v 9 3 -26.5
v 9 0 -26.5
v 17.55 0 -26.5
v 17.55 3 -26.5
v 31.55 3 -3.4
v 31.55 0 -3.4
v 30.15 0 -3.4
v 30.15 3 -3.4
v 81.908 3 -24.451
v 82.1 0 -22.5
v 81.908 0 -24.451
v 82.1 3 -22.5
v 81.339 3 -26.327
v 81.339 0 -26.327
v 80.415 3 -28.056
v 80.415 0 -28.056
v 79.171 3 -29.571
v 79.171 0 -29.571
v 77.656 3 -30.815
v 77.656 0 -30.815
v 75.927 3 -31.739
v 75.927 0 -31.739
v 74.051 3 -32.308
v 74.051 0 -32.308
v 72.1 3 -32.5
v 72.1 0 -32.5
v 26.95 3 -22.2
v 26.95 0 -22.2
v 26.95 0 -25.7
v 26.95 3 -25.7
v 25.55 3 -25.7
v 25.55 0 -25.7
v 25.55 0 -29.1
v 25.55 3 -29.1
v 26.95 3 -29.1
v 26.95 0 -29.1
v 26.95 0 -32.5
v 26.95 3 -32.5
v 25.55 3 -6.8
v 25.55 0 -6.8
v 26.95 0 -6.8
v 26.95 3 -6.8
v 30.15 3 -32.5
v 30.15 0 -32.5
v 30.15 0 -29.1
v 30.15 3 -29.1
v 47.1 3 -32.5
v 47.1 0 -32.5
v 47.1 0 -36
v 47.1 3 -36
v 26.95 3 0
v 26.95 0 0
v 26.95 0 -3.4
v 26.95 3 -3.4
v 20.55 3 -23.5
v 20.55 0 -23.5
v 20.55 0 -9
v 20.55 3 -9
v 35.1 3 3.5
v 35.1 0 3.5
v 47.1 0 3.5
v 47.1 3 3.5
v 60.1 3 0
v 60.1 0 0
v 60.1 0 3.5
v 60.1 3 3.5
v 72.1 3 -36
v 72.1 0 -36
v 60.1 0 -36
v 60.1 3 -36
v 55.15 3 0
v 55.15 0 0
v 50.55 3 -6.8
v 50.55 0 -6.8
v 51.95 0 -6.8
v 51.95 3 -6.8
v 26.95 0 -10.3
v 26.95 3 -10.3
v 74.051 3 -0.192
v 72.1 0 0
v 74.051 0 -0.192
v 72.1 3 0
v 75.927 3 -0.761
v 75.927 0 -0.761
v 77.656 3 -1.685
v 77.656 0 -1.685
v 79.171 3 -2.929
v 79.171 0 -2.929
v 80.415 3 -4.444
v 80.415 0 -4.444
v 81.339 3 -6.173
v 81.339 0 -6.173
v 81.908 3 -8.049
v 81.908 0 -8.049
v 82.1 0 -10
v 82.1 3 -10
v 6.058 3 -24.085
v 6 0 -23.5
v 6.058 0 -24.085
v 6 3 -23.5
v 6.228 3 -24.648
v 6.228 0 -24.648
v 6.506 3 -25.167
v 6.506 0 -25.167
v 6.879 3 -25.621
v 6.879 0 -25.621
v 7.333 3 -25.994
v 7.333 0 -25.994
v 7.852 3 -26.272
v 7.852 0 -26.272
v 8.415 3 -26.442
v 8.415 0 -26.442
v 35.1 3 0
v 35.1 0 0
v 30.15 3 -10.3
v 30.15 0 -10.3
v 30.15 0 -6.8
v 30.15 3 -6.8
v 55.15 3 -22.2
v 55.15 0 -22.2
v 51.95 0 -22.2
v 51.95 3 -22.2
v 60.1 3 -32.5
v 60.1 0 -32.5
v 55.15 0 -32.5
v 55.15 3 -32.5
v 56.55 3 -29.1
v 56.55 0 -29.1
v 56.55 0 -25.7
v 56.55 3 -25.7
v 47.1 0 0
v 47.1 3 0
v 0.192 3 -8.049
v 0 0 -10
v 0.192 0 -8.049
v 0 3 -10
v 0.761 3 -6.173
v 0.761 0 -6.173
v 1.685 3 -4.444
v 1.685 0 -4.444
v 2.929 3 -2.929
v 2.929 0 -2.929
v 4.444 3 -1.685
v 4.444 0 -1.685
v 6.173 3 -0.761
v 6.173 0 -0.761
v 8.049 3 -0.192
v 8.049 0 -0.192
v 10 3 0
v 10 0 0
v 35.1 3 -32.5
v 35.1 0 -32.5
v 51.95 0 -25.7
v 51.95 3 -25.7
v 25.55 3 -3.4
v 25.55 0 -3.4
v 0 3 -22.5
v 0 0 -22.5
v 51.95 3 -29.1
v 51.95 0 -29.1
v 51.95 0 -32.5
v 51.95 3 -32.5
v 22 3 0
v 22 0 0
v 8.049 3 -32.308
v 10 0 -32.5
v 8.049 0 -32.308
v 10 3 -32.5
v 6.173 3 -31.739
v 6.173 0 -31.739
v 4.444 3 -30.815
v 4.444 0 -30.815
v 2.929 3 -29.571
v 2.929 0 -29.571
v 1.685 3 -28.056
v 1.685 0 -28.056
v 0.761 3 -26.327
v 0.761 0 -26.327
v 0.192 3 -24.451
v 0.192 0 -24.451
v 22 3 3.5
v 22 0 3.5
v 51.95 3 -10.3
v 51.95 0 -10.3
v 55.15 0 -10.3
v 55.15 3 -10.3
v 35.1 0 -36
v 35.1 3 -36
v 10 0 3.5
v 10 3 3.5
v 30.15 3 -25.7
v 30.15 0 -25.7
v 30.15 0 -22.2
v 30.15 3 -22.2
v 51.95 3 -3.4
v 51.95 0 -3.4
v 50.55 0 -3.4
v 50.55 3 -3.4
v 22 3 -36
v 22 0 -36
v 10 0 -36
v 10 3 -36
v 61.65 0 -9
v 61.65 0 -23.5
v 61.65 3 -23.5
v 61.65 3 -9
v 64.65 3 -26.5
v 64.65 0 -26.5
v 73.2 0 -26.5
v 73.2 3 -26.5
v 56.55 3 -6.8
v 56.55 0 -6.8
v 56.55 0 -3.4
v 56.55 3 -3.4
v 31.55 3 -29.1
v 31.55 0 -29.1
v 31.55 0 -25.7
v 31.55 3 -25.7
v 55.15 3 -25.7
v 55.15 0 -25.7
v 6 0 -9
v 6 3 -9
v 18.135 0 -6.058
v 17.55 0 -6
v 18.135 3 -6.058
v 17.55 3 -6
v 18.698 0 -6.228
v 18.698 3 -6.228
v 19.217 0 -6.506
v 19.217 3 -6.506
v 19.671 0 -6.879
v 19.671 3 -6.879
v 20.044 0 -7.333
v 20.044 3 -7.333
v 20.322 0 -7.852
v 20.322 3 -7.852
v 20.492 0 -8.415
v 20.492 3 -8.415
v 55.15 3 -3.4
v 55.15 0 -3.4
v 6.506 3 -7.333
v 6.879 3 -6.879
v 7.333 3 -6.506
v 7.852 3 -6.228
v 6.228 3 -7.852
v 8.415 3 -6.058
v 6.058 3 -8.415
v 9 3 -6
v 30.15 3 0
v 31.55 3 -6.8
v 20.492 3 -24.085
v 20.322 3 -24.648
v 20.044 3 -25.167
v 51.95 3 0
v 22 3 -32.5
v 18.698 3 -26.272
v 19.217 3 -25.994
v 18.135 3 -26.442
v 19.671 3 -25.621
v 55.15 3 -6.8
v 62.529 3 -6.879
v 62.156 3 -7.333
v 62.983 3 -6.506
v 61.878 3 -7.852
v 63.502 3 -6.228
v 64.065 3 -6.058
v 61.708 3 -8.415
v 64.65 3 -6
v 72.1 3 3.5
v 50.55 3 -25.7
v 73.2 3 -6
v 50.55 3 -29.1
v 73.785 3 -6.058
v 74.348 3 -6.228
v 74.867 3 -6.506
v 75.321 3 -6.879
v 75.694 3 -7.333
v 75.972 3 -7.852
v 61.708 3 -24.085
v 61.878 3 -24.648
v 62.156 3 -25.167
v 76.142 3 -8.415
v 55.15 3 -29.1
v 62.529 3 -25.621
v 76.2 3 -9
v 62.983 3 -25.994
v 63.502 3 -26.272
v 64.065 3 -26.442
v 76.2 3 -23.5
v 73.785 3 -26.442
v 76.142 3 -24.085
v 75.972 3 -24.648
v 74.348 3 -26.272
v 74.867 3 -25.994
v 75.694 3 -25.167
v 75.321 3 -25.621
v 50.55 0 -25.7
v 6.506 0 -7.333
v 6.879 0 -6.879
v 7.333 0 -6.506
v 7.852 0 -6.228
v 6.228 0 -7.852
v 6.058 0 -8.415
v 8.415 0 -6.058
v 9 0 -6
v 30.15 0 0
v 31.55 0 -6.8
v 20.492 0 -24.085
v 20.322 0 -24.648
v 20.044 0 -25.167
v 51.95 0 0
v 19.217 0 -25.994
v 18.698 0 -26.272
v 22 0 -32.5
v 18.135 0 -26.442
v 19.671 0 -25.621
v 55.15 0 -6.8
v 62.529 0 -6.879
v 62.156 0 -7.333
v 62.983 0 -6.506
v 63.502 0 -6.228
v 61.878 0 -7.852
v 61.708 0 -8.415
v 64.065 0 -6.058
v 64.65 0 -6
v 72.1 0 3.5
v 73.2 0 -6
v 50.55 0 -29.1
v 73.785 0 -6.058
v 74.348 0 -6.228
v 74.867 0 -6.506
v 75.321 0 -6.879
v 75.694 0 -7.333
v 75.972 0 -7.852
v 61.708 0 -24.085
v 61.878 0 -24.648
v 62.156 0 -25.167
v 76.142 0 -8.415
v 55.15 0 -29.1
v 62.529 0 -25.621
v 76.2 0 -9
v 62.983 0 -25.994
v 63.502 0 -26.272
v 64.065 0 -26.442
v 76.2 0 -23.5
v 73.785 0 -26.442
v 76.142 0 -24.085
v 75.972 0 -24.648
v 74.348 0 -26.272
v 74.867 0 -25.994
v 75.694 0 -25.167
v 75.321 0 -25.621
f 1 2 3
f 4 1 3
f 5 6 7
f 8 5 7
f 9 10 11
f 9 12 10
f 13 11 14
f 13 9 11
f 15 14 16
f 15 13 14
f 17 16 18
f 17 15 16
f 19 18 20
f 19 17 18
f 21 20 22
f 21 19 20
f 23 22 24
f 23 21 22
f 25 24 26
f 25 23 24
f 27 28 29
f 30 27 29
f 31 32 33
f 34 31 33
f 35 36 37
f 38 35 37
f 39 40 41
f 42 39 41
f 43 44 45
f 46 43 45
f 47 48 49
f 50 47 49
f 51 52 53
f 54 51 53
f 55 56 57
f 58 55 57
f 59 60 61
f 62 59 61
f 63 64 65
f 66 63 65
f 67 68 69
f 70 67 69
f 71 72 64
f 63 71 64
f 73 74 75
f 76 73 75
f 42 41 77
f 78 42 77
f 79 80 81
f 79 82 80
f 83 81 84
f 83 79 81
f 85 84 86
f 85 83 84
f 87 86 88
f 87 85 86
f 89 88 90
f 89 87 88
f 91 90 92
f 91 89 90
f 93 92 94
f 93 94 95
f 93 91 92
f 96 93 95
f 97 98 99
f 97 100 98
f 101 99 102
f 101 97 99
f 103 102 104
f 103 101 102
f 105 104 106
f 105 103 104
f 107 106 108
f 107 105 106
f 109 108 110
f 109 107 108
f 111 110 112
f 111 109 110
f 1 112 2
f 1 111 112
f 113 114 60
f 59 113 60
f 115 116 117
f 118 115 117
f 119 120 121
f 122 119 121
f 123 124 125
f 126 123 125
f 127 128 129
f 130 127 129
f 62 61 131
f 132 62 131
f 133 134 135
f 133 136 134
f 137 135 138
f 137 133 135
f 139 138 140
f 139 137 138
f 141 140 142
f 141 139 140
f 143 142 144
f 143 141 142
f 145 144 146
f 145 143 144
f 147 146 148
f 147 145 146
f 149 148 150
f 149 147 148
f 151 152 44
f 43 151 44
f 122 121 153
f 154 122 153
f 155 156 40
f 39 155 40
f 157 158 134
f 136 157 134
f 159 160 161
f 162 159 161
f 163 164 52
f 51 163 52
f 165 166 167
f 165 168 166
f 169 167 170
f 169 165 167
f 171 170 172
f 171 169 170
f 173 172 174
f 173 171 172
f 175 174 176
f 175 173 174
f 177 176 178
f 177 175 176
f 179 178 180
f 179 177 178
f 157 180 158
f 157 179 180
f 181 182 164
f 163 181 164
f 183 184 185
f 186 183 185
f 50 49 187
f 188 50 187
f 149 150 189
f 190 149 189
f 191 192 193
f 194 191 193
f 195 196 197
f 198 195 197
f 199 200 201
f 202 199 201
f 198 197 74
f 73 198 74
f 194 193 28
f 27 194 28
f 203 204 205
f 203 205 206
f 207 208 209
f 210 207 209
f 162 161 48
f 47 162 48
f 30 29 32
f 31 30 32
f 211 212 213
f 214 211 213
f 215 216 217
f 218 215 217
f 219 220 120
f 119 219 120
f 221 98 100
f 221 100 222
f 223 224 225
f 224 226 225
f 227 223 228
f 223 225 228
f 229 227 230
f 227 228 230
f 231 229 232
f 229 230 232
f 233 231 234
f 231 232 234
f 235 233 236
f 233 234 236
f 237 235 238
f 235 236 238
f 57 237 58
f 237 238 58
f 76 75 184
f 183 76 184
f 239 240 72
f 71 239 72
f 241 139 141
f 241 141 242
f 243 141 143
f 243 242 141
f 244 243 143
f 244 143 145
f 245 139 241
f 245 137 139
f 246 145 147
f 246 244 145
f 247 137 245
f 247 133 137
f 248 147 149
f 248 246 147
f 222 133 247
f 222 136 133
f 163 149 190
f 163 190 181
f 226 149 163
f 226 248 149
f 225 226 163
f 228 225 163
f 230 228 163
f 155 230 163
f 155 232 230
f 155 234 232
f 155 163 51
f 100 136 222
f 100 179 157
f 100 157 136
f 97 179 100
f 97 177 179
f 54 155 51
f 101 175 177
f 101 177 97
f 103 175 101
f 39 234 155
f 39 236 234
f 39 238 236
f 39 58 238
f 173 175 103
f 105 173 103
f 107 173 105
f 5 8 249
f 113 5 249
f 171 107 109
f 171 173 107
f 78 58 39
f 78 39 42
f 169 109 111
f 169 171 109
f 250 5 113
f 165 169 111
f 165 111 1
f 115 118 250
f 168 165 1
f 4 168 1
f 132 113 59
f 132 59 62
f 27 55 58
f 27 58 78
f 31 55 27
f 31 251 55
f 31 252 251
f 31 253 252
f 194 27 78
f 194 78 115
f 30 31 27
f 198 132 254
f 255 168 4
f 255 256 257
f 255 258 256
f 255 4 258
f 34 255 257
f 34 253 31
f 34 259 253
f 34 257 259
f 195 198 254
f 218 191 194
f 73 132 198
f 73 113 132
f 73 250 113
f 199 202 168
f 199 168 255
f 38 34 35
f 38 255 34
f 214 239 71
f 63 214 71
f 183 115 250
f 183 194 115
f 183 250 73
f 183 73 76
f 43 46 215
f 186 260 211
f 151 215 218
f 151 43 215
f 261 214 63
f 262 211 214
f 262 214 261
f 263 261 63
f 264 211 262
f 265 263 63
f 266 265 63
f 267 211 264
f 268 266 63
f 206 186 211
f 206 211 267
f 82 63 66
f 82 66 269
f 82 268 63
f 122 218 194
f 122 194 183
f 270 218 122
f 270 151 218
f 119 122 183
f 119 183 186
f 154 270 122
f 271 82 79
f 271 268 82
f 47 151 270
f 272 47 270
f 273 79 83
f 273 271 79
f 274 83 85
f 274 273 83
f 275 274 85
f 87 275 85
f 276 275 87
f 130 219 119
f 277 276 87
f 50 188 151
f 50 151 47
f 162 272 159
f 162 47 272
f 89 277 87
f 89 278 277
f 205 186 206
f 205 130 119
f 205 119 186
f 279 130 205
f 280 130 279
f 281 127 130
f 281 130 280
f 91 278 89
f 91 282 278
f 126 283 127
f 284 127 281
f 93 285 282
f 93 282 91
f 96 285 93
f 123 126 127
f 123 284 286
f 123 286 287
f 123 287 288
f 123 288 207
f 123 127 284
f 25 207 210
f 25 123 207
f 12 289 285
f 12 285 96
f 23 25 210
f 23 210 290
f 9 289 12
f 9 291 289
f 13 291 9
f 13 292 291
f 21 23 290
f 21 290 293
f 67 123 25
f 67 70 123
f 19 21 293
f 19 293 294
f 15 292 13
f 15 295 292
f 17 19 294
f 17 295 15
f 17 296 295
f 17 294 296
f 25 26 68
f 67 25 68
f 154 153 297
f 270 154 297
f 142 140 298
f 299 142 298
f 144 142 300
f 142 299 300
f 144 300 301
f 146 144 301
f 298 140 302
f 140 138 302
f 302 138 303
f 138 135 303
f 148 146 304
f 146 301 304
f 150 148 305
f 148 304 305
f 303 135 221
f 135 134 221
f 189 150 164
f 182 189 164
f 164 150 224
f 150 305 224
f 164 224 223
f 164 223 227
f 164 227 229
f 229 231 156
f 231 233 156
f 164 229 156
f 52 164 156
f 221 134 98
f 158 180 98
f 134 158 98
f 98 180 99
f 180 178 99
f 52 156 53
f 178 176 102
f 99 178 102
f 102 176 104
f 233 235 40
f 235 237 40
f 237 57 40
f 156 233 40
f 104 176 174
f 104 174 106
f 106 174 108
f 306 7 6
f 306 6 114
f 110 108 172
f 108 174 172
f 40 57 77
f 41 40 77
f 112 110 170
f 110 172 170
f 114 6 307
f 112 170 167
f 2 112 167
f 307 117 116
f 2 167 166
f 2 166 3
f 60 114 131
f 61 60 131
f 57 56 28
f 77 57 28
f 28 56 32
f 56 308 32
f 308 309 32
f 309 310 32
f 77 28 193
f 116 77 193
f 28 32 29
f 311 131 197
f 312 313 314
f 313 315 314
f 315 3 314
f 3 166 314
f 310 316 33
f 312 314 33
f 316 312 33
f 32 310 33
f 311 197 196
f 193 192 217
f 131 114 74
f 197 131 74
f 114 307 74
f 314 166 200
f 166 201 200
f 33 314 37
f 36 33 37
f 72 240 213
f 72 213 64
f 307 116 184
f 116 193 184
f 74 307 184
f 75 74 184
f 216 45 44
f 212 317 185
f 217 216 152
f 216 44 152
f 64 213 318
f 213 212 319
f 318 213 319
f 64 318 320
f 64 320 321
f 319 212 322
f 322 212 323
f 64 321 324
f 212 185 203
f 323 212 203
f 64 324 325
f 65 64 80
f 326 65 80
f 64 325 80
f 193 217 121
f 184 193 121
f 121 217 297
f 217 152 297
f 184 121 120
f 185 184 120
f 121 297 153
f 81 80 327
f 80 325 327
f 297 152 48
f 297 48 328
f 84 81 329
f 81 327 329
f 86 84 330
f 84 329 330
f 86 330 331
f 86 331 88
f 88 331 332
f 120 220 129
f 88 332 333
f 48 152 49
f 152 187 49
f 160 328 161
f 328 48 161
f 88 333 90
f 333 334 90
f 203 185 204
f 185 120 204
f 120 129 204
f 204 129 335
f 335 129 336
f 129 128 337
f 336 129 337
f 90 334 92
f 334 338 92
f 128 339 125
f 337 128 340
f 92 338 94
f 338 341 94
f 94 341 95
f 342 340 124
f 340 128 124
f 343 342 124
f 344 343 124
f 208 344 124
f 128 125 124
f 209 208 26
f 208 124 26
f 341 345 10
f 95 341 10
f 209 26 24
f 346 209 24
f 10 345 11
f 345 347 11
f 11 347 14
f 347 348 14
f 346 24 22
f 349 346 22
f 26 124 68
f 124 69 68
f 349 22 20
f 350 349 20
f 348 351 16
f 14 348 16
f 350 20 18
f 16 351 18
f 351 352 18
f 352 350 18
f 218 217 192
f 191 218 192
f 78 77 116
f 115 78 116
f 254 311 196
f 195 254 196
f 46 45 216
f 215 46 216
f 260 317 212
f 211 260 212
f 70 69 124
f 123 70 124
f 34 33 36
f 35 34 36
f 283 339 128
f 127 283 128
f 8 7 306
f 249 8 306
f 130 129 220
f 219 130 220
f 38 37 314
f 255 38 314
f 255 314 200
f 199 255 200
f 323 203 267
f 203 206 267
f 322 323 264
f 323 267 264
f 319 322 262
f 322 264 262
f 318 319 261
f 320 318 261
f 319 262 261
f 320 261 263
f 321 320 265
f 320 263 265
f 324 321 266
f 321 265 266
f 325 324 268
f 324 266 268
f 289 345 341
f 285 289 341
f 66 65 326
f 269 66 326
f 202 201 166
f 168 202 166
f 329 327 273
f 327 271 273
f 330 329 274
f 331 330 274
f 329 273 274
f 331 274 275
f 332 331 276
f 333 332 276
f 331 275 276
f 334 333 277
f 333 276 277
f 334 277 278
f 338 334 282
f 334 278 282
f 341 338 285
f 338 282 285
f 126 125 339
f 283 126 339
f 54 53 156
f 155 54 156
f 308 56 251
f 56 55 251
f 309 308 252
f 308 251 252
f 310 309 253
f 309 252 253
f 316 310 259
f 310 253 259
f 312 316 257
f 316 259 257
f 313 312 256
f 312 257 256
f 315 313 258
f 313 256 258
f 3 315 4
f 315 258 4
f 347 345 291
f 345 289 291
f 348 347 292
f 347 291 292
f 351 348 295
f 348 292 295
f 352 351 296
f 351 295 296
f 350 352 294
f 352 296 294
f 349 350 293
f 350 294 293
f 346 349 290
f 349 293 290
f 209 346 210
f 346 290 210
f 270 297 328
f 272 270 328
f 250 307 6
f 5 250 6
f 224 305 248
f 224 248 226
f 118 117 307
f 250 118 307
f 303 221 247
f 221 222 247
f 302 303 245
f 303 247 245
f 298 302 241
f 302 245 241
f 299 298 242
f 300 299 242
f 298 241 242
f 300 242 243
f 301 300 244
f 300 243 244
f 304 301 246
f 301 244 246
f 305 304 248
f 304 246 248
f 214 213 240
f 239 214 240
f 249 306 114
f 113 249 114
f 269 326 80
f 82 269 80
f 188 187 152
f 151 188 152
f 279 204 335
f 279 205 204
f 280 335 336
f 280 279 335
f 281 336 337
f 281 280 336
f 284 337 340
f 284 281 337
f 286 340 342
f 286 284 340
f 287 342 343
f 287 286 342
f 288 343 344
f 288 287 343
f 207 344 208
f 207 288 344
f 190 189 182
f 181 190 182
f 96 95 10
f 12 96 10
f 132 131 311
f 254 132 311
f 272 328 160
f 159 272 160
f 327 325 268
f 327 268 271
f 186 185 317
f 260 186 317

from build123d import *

# Parameters (mm, degrees)
EXTRUDE_1_DEPTH     = 3
FILLET_1_R          = 10
SKETCH_2_W          = 14.55
SKETCH_2_H          = 20.5
CUT_EXTRUDE_1_DEPTH = 90.696209507
FILLET_2_R          = 3


with BuildPart() as part:
    # 草图1 → 凸台-拉伸1 (new body)
    with BuildSketch(Plane(origin=(0, 0, 0), x_dir=(1, 0, 0), z_dir=(0, 1, 0))):
        Polygon((10, 0), (10, -3.5), (22, -3.5), (22, 0), (26.95, 0), (26.95, 3.4), (25.55, 3.4), (25.55, 6.8), (26.95, 6.8), (26.95, 10.3), (30.15, 10.3), (30.15, 6.8), (31.55, 6.8), (31.55, 3.4), (30.15, 3.4), (30.15, 0), (35.1, 0), (35.1, -3.5), (47.1, -3.5), (47.1, 0), (51.95, 0), (51.95, 3.4), (50.55, 3.4), (50.55, 6.8), (51.95, 6.8), (51.95, 10.3), (55.15, 10.3), (55.15, 6.8), (56.55, 6.8), (56.55, 3.4), (55.15, 3.4), (55.15, 0), (60.1, 0), (60.1, -3.5), (72.1, -3.5), (72.1, 0), (82.1, 0), (82.1, 32.5), (72.1, 32.5), (72.1, 36), (60.1, 36), (60.1, 32.5), (55.15, 32.5), (55.15, 29.1), (56.55, 29.1), (56.55, 25.7), (55.15, 25.7), (55.15, 22.2), (51.95, 22.2), (51.95, 25.7), (50.55, 25.7), (50.55, 29.1), (51.95, 29.1), (51.95, 32.5), (47.1, 32.5), (47.1, 36), (35.1, 36), (35.1, 32.5), (30.15, 32.5), (30.15, 29.1), (31.55, 29.1), (31.55, 25.7), (30.15, 25.7), (30.15, 22.2), (26.95, 22.2), (26.95, 25.7), (25.55, 25.7), (25.55, 29.1), (26.95, 29.1), (26.95, 32.5), (22, 32.5), (22, 36), (10, 36), (10, 32.5), (0, 32.5), (0, 0), align=None)
    extrude(amount=EXTRUDE_1_DEPTH)

    # 圆角1
    fillet_1_edges = [part.edges().sort_by_distance(p)[0] for p in [
        (0, 1.5, -32.5),
        (82.1, 1.5, -32.5),
        (82.1, 1.5, 0),
        (0, 1.5, 0),
    ]]
    fillet(fillet_1_edges, radius=FILLET_1_R - 0.0001)  # a hair under: the kernel refuses the full size

    # 草图2 → 切除-拉伸1 (cut, through all)
    with BuildSketch(Plane.XZ):
        with Locations((13.275, -16.25)):
            Rectangle(SKETCH_2_W, SKETCH_2_H)
        with Locations((68.925, -16.25)):
            Rectangle(SKETCH_2_W, SKETCH_2_H)
    extrude(amount=-CUT_EXTRUDE_1_DEPTH, mode=Mode.SUBTRACT)

    # 圆角2
    fillet_2_edges = [part.edges().sort_by_distance(p)[0] for p in [
        (6, 1.5, -26.5),
        (6, 1.5, -6),
        (20.55, 1.5, -6),
        (20.55, 1.5, -26.5),
        (61.65, 1.5, -6),
        (76.2, 1.5, -6),
        (76.2, 1.5, -26.5),
        (61.65, 1.5, -26.5),
    ]]
    fillet(fillet_2_edges, radius=FILLET_2_R)


solid = part.part
